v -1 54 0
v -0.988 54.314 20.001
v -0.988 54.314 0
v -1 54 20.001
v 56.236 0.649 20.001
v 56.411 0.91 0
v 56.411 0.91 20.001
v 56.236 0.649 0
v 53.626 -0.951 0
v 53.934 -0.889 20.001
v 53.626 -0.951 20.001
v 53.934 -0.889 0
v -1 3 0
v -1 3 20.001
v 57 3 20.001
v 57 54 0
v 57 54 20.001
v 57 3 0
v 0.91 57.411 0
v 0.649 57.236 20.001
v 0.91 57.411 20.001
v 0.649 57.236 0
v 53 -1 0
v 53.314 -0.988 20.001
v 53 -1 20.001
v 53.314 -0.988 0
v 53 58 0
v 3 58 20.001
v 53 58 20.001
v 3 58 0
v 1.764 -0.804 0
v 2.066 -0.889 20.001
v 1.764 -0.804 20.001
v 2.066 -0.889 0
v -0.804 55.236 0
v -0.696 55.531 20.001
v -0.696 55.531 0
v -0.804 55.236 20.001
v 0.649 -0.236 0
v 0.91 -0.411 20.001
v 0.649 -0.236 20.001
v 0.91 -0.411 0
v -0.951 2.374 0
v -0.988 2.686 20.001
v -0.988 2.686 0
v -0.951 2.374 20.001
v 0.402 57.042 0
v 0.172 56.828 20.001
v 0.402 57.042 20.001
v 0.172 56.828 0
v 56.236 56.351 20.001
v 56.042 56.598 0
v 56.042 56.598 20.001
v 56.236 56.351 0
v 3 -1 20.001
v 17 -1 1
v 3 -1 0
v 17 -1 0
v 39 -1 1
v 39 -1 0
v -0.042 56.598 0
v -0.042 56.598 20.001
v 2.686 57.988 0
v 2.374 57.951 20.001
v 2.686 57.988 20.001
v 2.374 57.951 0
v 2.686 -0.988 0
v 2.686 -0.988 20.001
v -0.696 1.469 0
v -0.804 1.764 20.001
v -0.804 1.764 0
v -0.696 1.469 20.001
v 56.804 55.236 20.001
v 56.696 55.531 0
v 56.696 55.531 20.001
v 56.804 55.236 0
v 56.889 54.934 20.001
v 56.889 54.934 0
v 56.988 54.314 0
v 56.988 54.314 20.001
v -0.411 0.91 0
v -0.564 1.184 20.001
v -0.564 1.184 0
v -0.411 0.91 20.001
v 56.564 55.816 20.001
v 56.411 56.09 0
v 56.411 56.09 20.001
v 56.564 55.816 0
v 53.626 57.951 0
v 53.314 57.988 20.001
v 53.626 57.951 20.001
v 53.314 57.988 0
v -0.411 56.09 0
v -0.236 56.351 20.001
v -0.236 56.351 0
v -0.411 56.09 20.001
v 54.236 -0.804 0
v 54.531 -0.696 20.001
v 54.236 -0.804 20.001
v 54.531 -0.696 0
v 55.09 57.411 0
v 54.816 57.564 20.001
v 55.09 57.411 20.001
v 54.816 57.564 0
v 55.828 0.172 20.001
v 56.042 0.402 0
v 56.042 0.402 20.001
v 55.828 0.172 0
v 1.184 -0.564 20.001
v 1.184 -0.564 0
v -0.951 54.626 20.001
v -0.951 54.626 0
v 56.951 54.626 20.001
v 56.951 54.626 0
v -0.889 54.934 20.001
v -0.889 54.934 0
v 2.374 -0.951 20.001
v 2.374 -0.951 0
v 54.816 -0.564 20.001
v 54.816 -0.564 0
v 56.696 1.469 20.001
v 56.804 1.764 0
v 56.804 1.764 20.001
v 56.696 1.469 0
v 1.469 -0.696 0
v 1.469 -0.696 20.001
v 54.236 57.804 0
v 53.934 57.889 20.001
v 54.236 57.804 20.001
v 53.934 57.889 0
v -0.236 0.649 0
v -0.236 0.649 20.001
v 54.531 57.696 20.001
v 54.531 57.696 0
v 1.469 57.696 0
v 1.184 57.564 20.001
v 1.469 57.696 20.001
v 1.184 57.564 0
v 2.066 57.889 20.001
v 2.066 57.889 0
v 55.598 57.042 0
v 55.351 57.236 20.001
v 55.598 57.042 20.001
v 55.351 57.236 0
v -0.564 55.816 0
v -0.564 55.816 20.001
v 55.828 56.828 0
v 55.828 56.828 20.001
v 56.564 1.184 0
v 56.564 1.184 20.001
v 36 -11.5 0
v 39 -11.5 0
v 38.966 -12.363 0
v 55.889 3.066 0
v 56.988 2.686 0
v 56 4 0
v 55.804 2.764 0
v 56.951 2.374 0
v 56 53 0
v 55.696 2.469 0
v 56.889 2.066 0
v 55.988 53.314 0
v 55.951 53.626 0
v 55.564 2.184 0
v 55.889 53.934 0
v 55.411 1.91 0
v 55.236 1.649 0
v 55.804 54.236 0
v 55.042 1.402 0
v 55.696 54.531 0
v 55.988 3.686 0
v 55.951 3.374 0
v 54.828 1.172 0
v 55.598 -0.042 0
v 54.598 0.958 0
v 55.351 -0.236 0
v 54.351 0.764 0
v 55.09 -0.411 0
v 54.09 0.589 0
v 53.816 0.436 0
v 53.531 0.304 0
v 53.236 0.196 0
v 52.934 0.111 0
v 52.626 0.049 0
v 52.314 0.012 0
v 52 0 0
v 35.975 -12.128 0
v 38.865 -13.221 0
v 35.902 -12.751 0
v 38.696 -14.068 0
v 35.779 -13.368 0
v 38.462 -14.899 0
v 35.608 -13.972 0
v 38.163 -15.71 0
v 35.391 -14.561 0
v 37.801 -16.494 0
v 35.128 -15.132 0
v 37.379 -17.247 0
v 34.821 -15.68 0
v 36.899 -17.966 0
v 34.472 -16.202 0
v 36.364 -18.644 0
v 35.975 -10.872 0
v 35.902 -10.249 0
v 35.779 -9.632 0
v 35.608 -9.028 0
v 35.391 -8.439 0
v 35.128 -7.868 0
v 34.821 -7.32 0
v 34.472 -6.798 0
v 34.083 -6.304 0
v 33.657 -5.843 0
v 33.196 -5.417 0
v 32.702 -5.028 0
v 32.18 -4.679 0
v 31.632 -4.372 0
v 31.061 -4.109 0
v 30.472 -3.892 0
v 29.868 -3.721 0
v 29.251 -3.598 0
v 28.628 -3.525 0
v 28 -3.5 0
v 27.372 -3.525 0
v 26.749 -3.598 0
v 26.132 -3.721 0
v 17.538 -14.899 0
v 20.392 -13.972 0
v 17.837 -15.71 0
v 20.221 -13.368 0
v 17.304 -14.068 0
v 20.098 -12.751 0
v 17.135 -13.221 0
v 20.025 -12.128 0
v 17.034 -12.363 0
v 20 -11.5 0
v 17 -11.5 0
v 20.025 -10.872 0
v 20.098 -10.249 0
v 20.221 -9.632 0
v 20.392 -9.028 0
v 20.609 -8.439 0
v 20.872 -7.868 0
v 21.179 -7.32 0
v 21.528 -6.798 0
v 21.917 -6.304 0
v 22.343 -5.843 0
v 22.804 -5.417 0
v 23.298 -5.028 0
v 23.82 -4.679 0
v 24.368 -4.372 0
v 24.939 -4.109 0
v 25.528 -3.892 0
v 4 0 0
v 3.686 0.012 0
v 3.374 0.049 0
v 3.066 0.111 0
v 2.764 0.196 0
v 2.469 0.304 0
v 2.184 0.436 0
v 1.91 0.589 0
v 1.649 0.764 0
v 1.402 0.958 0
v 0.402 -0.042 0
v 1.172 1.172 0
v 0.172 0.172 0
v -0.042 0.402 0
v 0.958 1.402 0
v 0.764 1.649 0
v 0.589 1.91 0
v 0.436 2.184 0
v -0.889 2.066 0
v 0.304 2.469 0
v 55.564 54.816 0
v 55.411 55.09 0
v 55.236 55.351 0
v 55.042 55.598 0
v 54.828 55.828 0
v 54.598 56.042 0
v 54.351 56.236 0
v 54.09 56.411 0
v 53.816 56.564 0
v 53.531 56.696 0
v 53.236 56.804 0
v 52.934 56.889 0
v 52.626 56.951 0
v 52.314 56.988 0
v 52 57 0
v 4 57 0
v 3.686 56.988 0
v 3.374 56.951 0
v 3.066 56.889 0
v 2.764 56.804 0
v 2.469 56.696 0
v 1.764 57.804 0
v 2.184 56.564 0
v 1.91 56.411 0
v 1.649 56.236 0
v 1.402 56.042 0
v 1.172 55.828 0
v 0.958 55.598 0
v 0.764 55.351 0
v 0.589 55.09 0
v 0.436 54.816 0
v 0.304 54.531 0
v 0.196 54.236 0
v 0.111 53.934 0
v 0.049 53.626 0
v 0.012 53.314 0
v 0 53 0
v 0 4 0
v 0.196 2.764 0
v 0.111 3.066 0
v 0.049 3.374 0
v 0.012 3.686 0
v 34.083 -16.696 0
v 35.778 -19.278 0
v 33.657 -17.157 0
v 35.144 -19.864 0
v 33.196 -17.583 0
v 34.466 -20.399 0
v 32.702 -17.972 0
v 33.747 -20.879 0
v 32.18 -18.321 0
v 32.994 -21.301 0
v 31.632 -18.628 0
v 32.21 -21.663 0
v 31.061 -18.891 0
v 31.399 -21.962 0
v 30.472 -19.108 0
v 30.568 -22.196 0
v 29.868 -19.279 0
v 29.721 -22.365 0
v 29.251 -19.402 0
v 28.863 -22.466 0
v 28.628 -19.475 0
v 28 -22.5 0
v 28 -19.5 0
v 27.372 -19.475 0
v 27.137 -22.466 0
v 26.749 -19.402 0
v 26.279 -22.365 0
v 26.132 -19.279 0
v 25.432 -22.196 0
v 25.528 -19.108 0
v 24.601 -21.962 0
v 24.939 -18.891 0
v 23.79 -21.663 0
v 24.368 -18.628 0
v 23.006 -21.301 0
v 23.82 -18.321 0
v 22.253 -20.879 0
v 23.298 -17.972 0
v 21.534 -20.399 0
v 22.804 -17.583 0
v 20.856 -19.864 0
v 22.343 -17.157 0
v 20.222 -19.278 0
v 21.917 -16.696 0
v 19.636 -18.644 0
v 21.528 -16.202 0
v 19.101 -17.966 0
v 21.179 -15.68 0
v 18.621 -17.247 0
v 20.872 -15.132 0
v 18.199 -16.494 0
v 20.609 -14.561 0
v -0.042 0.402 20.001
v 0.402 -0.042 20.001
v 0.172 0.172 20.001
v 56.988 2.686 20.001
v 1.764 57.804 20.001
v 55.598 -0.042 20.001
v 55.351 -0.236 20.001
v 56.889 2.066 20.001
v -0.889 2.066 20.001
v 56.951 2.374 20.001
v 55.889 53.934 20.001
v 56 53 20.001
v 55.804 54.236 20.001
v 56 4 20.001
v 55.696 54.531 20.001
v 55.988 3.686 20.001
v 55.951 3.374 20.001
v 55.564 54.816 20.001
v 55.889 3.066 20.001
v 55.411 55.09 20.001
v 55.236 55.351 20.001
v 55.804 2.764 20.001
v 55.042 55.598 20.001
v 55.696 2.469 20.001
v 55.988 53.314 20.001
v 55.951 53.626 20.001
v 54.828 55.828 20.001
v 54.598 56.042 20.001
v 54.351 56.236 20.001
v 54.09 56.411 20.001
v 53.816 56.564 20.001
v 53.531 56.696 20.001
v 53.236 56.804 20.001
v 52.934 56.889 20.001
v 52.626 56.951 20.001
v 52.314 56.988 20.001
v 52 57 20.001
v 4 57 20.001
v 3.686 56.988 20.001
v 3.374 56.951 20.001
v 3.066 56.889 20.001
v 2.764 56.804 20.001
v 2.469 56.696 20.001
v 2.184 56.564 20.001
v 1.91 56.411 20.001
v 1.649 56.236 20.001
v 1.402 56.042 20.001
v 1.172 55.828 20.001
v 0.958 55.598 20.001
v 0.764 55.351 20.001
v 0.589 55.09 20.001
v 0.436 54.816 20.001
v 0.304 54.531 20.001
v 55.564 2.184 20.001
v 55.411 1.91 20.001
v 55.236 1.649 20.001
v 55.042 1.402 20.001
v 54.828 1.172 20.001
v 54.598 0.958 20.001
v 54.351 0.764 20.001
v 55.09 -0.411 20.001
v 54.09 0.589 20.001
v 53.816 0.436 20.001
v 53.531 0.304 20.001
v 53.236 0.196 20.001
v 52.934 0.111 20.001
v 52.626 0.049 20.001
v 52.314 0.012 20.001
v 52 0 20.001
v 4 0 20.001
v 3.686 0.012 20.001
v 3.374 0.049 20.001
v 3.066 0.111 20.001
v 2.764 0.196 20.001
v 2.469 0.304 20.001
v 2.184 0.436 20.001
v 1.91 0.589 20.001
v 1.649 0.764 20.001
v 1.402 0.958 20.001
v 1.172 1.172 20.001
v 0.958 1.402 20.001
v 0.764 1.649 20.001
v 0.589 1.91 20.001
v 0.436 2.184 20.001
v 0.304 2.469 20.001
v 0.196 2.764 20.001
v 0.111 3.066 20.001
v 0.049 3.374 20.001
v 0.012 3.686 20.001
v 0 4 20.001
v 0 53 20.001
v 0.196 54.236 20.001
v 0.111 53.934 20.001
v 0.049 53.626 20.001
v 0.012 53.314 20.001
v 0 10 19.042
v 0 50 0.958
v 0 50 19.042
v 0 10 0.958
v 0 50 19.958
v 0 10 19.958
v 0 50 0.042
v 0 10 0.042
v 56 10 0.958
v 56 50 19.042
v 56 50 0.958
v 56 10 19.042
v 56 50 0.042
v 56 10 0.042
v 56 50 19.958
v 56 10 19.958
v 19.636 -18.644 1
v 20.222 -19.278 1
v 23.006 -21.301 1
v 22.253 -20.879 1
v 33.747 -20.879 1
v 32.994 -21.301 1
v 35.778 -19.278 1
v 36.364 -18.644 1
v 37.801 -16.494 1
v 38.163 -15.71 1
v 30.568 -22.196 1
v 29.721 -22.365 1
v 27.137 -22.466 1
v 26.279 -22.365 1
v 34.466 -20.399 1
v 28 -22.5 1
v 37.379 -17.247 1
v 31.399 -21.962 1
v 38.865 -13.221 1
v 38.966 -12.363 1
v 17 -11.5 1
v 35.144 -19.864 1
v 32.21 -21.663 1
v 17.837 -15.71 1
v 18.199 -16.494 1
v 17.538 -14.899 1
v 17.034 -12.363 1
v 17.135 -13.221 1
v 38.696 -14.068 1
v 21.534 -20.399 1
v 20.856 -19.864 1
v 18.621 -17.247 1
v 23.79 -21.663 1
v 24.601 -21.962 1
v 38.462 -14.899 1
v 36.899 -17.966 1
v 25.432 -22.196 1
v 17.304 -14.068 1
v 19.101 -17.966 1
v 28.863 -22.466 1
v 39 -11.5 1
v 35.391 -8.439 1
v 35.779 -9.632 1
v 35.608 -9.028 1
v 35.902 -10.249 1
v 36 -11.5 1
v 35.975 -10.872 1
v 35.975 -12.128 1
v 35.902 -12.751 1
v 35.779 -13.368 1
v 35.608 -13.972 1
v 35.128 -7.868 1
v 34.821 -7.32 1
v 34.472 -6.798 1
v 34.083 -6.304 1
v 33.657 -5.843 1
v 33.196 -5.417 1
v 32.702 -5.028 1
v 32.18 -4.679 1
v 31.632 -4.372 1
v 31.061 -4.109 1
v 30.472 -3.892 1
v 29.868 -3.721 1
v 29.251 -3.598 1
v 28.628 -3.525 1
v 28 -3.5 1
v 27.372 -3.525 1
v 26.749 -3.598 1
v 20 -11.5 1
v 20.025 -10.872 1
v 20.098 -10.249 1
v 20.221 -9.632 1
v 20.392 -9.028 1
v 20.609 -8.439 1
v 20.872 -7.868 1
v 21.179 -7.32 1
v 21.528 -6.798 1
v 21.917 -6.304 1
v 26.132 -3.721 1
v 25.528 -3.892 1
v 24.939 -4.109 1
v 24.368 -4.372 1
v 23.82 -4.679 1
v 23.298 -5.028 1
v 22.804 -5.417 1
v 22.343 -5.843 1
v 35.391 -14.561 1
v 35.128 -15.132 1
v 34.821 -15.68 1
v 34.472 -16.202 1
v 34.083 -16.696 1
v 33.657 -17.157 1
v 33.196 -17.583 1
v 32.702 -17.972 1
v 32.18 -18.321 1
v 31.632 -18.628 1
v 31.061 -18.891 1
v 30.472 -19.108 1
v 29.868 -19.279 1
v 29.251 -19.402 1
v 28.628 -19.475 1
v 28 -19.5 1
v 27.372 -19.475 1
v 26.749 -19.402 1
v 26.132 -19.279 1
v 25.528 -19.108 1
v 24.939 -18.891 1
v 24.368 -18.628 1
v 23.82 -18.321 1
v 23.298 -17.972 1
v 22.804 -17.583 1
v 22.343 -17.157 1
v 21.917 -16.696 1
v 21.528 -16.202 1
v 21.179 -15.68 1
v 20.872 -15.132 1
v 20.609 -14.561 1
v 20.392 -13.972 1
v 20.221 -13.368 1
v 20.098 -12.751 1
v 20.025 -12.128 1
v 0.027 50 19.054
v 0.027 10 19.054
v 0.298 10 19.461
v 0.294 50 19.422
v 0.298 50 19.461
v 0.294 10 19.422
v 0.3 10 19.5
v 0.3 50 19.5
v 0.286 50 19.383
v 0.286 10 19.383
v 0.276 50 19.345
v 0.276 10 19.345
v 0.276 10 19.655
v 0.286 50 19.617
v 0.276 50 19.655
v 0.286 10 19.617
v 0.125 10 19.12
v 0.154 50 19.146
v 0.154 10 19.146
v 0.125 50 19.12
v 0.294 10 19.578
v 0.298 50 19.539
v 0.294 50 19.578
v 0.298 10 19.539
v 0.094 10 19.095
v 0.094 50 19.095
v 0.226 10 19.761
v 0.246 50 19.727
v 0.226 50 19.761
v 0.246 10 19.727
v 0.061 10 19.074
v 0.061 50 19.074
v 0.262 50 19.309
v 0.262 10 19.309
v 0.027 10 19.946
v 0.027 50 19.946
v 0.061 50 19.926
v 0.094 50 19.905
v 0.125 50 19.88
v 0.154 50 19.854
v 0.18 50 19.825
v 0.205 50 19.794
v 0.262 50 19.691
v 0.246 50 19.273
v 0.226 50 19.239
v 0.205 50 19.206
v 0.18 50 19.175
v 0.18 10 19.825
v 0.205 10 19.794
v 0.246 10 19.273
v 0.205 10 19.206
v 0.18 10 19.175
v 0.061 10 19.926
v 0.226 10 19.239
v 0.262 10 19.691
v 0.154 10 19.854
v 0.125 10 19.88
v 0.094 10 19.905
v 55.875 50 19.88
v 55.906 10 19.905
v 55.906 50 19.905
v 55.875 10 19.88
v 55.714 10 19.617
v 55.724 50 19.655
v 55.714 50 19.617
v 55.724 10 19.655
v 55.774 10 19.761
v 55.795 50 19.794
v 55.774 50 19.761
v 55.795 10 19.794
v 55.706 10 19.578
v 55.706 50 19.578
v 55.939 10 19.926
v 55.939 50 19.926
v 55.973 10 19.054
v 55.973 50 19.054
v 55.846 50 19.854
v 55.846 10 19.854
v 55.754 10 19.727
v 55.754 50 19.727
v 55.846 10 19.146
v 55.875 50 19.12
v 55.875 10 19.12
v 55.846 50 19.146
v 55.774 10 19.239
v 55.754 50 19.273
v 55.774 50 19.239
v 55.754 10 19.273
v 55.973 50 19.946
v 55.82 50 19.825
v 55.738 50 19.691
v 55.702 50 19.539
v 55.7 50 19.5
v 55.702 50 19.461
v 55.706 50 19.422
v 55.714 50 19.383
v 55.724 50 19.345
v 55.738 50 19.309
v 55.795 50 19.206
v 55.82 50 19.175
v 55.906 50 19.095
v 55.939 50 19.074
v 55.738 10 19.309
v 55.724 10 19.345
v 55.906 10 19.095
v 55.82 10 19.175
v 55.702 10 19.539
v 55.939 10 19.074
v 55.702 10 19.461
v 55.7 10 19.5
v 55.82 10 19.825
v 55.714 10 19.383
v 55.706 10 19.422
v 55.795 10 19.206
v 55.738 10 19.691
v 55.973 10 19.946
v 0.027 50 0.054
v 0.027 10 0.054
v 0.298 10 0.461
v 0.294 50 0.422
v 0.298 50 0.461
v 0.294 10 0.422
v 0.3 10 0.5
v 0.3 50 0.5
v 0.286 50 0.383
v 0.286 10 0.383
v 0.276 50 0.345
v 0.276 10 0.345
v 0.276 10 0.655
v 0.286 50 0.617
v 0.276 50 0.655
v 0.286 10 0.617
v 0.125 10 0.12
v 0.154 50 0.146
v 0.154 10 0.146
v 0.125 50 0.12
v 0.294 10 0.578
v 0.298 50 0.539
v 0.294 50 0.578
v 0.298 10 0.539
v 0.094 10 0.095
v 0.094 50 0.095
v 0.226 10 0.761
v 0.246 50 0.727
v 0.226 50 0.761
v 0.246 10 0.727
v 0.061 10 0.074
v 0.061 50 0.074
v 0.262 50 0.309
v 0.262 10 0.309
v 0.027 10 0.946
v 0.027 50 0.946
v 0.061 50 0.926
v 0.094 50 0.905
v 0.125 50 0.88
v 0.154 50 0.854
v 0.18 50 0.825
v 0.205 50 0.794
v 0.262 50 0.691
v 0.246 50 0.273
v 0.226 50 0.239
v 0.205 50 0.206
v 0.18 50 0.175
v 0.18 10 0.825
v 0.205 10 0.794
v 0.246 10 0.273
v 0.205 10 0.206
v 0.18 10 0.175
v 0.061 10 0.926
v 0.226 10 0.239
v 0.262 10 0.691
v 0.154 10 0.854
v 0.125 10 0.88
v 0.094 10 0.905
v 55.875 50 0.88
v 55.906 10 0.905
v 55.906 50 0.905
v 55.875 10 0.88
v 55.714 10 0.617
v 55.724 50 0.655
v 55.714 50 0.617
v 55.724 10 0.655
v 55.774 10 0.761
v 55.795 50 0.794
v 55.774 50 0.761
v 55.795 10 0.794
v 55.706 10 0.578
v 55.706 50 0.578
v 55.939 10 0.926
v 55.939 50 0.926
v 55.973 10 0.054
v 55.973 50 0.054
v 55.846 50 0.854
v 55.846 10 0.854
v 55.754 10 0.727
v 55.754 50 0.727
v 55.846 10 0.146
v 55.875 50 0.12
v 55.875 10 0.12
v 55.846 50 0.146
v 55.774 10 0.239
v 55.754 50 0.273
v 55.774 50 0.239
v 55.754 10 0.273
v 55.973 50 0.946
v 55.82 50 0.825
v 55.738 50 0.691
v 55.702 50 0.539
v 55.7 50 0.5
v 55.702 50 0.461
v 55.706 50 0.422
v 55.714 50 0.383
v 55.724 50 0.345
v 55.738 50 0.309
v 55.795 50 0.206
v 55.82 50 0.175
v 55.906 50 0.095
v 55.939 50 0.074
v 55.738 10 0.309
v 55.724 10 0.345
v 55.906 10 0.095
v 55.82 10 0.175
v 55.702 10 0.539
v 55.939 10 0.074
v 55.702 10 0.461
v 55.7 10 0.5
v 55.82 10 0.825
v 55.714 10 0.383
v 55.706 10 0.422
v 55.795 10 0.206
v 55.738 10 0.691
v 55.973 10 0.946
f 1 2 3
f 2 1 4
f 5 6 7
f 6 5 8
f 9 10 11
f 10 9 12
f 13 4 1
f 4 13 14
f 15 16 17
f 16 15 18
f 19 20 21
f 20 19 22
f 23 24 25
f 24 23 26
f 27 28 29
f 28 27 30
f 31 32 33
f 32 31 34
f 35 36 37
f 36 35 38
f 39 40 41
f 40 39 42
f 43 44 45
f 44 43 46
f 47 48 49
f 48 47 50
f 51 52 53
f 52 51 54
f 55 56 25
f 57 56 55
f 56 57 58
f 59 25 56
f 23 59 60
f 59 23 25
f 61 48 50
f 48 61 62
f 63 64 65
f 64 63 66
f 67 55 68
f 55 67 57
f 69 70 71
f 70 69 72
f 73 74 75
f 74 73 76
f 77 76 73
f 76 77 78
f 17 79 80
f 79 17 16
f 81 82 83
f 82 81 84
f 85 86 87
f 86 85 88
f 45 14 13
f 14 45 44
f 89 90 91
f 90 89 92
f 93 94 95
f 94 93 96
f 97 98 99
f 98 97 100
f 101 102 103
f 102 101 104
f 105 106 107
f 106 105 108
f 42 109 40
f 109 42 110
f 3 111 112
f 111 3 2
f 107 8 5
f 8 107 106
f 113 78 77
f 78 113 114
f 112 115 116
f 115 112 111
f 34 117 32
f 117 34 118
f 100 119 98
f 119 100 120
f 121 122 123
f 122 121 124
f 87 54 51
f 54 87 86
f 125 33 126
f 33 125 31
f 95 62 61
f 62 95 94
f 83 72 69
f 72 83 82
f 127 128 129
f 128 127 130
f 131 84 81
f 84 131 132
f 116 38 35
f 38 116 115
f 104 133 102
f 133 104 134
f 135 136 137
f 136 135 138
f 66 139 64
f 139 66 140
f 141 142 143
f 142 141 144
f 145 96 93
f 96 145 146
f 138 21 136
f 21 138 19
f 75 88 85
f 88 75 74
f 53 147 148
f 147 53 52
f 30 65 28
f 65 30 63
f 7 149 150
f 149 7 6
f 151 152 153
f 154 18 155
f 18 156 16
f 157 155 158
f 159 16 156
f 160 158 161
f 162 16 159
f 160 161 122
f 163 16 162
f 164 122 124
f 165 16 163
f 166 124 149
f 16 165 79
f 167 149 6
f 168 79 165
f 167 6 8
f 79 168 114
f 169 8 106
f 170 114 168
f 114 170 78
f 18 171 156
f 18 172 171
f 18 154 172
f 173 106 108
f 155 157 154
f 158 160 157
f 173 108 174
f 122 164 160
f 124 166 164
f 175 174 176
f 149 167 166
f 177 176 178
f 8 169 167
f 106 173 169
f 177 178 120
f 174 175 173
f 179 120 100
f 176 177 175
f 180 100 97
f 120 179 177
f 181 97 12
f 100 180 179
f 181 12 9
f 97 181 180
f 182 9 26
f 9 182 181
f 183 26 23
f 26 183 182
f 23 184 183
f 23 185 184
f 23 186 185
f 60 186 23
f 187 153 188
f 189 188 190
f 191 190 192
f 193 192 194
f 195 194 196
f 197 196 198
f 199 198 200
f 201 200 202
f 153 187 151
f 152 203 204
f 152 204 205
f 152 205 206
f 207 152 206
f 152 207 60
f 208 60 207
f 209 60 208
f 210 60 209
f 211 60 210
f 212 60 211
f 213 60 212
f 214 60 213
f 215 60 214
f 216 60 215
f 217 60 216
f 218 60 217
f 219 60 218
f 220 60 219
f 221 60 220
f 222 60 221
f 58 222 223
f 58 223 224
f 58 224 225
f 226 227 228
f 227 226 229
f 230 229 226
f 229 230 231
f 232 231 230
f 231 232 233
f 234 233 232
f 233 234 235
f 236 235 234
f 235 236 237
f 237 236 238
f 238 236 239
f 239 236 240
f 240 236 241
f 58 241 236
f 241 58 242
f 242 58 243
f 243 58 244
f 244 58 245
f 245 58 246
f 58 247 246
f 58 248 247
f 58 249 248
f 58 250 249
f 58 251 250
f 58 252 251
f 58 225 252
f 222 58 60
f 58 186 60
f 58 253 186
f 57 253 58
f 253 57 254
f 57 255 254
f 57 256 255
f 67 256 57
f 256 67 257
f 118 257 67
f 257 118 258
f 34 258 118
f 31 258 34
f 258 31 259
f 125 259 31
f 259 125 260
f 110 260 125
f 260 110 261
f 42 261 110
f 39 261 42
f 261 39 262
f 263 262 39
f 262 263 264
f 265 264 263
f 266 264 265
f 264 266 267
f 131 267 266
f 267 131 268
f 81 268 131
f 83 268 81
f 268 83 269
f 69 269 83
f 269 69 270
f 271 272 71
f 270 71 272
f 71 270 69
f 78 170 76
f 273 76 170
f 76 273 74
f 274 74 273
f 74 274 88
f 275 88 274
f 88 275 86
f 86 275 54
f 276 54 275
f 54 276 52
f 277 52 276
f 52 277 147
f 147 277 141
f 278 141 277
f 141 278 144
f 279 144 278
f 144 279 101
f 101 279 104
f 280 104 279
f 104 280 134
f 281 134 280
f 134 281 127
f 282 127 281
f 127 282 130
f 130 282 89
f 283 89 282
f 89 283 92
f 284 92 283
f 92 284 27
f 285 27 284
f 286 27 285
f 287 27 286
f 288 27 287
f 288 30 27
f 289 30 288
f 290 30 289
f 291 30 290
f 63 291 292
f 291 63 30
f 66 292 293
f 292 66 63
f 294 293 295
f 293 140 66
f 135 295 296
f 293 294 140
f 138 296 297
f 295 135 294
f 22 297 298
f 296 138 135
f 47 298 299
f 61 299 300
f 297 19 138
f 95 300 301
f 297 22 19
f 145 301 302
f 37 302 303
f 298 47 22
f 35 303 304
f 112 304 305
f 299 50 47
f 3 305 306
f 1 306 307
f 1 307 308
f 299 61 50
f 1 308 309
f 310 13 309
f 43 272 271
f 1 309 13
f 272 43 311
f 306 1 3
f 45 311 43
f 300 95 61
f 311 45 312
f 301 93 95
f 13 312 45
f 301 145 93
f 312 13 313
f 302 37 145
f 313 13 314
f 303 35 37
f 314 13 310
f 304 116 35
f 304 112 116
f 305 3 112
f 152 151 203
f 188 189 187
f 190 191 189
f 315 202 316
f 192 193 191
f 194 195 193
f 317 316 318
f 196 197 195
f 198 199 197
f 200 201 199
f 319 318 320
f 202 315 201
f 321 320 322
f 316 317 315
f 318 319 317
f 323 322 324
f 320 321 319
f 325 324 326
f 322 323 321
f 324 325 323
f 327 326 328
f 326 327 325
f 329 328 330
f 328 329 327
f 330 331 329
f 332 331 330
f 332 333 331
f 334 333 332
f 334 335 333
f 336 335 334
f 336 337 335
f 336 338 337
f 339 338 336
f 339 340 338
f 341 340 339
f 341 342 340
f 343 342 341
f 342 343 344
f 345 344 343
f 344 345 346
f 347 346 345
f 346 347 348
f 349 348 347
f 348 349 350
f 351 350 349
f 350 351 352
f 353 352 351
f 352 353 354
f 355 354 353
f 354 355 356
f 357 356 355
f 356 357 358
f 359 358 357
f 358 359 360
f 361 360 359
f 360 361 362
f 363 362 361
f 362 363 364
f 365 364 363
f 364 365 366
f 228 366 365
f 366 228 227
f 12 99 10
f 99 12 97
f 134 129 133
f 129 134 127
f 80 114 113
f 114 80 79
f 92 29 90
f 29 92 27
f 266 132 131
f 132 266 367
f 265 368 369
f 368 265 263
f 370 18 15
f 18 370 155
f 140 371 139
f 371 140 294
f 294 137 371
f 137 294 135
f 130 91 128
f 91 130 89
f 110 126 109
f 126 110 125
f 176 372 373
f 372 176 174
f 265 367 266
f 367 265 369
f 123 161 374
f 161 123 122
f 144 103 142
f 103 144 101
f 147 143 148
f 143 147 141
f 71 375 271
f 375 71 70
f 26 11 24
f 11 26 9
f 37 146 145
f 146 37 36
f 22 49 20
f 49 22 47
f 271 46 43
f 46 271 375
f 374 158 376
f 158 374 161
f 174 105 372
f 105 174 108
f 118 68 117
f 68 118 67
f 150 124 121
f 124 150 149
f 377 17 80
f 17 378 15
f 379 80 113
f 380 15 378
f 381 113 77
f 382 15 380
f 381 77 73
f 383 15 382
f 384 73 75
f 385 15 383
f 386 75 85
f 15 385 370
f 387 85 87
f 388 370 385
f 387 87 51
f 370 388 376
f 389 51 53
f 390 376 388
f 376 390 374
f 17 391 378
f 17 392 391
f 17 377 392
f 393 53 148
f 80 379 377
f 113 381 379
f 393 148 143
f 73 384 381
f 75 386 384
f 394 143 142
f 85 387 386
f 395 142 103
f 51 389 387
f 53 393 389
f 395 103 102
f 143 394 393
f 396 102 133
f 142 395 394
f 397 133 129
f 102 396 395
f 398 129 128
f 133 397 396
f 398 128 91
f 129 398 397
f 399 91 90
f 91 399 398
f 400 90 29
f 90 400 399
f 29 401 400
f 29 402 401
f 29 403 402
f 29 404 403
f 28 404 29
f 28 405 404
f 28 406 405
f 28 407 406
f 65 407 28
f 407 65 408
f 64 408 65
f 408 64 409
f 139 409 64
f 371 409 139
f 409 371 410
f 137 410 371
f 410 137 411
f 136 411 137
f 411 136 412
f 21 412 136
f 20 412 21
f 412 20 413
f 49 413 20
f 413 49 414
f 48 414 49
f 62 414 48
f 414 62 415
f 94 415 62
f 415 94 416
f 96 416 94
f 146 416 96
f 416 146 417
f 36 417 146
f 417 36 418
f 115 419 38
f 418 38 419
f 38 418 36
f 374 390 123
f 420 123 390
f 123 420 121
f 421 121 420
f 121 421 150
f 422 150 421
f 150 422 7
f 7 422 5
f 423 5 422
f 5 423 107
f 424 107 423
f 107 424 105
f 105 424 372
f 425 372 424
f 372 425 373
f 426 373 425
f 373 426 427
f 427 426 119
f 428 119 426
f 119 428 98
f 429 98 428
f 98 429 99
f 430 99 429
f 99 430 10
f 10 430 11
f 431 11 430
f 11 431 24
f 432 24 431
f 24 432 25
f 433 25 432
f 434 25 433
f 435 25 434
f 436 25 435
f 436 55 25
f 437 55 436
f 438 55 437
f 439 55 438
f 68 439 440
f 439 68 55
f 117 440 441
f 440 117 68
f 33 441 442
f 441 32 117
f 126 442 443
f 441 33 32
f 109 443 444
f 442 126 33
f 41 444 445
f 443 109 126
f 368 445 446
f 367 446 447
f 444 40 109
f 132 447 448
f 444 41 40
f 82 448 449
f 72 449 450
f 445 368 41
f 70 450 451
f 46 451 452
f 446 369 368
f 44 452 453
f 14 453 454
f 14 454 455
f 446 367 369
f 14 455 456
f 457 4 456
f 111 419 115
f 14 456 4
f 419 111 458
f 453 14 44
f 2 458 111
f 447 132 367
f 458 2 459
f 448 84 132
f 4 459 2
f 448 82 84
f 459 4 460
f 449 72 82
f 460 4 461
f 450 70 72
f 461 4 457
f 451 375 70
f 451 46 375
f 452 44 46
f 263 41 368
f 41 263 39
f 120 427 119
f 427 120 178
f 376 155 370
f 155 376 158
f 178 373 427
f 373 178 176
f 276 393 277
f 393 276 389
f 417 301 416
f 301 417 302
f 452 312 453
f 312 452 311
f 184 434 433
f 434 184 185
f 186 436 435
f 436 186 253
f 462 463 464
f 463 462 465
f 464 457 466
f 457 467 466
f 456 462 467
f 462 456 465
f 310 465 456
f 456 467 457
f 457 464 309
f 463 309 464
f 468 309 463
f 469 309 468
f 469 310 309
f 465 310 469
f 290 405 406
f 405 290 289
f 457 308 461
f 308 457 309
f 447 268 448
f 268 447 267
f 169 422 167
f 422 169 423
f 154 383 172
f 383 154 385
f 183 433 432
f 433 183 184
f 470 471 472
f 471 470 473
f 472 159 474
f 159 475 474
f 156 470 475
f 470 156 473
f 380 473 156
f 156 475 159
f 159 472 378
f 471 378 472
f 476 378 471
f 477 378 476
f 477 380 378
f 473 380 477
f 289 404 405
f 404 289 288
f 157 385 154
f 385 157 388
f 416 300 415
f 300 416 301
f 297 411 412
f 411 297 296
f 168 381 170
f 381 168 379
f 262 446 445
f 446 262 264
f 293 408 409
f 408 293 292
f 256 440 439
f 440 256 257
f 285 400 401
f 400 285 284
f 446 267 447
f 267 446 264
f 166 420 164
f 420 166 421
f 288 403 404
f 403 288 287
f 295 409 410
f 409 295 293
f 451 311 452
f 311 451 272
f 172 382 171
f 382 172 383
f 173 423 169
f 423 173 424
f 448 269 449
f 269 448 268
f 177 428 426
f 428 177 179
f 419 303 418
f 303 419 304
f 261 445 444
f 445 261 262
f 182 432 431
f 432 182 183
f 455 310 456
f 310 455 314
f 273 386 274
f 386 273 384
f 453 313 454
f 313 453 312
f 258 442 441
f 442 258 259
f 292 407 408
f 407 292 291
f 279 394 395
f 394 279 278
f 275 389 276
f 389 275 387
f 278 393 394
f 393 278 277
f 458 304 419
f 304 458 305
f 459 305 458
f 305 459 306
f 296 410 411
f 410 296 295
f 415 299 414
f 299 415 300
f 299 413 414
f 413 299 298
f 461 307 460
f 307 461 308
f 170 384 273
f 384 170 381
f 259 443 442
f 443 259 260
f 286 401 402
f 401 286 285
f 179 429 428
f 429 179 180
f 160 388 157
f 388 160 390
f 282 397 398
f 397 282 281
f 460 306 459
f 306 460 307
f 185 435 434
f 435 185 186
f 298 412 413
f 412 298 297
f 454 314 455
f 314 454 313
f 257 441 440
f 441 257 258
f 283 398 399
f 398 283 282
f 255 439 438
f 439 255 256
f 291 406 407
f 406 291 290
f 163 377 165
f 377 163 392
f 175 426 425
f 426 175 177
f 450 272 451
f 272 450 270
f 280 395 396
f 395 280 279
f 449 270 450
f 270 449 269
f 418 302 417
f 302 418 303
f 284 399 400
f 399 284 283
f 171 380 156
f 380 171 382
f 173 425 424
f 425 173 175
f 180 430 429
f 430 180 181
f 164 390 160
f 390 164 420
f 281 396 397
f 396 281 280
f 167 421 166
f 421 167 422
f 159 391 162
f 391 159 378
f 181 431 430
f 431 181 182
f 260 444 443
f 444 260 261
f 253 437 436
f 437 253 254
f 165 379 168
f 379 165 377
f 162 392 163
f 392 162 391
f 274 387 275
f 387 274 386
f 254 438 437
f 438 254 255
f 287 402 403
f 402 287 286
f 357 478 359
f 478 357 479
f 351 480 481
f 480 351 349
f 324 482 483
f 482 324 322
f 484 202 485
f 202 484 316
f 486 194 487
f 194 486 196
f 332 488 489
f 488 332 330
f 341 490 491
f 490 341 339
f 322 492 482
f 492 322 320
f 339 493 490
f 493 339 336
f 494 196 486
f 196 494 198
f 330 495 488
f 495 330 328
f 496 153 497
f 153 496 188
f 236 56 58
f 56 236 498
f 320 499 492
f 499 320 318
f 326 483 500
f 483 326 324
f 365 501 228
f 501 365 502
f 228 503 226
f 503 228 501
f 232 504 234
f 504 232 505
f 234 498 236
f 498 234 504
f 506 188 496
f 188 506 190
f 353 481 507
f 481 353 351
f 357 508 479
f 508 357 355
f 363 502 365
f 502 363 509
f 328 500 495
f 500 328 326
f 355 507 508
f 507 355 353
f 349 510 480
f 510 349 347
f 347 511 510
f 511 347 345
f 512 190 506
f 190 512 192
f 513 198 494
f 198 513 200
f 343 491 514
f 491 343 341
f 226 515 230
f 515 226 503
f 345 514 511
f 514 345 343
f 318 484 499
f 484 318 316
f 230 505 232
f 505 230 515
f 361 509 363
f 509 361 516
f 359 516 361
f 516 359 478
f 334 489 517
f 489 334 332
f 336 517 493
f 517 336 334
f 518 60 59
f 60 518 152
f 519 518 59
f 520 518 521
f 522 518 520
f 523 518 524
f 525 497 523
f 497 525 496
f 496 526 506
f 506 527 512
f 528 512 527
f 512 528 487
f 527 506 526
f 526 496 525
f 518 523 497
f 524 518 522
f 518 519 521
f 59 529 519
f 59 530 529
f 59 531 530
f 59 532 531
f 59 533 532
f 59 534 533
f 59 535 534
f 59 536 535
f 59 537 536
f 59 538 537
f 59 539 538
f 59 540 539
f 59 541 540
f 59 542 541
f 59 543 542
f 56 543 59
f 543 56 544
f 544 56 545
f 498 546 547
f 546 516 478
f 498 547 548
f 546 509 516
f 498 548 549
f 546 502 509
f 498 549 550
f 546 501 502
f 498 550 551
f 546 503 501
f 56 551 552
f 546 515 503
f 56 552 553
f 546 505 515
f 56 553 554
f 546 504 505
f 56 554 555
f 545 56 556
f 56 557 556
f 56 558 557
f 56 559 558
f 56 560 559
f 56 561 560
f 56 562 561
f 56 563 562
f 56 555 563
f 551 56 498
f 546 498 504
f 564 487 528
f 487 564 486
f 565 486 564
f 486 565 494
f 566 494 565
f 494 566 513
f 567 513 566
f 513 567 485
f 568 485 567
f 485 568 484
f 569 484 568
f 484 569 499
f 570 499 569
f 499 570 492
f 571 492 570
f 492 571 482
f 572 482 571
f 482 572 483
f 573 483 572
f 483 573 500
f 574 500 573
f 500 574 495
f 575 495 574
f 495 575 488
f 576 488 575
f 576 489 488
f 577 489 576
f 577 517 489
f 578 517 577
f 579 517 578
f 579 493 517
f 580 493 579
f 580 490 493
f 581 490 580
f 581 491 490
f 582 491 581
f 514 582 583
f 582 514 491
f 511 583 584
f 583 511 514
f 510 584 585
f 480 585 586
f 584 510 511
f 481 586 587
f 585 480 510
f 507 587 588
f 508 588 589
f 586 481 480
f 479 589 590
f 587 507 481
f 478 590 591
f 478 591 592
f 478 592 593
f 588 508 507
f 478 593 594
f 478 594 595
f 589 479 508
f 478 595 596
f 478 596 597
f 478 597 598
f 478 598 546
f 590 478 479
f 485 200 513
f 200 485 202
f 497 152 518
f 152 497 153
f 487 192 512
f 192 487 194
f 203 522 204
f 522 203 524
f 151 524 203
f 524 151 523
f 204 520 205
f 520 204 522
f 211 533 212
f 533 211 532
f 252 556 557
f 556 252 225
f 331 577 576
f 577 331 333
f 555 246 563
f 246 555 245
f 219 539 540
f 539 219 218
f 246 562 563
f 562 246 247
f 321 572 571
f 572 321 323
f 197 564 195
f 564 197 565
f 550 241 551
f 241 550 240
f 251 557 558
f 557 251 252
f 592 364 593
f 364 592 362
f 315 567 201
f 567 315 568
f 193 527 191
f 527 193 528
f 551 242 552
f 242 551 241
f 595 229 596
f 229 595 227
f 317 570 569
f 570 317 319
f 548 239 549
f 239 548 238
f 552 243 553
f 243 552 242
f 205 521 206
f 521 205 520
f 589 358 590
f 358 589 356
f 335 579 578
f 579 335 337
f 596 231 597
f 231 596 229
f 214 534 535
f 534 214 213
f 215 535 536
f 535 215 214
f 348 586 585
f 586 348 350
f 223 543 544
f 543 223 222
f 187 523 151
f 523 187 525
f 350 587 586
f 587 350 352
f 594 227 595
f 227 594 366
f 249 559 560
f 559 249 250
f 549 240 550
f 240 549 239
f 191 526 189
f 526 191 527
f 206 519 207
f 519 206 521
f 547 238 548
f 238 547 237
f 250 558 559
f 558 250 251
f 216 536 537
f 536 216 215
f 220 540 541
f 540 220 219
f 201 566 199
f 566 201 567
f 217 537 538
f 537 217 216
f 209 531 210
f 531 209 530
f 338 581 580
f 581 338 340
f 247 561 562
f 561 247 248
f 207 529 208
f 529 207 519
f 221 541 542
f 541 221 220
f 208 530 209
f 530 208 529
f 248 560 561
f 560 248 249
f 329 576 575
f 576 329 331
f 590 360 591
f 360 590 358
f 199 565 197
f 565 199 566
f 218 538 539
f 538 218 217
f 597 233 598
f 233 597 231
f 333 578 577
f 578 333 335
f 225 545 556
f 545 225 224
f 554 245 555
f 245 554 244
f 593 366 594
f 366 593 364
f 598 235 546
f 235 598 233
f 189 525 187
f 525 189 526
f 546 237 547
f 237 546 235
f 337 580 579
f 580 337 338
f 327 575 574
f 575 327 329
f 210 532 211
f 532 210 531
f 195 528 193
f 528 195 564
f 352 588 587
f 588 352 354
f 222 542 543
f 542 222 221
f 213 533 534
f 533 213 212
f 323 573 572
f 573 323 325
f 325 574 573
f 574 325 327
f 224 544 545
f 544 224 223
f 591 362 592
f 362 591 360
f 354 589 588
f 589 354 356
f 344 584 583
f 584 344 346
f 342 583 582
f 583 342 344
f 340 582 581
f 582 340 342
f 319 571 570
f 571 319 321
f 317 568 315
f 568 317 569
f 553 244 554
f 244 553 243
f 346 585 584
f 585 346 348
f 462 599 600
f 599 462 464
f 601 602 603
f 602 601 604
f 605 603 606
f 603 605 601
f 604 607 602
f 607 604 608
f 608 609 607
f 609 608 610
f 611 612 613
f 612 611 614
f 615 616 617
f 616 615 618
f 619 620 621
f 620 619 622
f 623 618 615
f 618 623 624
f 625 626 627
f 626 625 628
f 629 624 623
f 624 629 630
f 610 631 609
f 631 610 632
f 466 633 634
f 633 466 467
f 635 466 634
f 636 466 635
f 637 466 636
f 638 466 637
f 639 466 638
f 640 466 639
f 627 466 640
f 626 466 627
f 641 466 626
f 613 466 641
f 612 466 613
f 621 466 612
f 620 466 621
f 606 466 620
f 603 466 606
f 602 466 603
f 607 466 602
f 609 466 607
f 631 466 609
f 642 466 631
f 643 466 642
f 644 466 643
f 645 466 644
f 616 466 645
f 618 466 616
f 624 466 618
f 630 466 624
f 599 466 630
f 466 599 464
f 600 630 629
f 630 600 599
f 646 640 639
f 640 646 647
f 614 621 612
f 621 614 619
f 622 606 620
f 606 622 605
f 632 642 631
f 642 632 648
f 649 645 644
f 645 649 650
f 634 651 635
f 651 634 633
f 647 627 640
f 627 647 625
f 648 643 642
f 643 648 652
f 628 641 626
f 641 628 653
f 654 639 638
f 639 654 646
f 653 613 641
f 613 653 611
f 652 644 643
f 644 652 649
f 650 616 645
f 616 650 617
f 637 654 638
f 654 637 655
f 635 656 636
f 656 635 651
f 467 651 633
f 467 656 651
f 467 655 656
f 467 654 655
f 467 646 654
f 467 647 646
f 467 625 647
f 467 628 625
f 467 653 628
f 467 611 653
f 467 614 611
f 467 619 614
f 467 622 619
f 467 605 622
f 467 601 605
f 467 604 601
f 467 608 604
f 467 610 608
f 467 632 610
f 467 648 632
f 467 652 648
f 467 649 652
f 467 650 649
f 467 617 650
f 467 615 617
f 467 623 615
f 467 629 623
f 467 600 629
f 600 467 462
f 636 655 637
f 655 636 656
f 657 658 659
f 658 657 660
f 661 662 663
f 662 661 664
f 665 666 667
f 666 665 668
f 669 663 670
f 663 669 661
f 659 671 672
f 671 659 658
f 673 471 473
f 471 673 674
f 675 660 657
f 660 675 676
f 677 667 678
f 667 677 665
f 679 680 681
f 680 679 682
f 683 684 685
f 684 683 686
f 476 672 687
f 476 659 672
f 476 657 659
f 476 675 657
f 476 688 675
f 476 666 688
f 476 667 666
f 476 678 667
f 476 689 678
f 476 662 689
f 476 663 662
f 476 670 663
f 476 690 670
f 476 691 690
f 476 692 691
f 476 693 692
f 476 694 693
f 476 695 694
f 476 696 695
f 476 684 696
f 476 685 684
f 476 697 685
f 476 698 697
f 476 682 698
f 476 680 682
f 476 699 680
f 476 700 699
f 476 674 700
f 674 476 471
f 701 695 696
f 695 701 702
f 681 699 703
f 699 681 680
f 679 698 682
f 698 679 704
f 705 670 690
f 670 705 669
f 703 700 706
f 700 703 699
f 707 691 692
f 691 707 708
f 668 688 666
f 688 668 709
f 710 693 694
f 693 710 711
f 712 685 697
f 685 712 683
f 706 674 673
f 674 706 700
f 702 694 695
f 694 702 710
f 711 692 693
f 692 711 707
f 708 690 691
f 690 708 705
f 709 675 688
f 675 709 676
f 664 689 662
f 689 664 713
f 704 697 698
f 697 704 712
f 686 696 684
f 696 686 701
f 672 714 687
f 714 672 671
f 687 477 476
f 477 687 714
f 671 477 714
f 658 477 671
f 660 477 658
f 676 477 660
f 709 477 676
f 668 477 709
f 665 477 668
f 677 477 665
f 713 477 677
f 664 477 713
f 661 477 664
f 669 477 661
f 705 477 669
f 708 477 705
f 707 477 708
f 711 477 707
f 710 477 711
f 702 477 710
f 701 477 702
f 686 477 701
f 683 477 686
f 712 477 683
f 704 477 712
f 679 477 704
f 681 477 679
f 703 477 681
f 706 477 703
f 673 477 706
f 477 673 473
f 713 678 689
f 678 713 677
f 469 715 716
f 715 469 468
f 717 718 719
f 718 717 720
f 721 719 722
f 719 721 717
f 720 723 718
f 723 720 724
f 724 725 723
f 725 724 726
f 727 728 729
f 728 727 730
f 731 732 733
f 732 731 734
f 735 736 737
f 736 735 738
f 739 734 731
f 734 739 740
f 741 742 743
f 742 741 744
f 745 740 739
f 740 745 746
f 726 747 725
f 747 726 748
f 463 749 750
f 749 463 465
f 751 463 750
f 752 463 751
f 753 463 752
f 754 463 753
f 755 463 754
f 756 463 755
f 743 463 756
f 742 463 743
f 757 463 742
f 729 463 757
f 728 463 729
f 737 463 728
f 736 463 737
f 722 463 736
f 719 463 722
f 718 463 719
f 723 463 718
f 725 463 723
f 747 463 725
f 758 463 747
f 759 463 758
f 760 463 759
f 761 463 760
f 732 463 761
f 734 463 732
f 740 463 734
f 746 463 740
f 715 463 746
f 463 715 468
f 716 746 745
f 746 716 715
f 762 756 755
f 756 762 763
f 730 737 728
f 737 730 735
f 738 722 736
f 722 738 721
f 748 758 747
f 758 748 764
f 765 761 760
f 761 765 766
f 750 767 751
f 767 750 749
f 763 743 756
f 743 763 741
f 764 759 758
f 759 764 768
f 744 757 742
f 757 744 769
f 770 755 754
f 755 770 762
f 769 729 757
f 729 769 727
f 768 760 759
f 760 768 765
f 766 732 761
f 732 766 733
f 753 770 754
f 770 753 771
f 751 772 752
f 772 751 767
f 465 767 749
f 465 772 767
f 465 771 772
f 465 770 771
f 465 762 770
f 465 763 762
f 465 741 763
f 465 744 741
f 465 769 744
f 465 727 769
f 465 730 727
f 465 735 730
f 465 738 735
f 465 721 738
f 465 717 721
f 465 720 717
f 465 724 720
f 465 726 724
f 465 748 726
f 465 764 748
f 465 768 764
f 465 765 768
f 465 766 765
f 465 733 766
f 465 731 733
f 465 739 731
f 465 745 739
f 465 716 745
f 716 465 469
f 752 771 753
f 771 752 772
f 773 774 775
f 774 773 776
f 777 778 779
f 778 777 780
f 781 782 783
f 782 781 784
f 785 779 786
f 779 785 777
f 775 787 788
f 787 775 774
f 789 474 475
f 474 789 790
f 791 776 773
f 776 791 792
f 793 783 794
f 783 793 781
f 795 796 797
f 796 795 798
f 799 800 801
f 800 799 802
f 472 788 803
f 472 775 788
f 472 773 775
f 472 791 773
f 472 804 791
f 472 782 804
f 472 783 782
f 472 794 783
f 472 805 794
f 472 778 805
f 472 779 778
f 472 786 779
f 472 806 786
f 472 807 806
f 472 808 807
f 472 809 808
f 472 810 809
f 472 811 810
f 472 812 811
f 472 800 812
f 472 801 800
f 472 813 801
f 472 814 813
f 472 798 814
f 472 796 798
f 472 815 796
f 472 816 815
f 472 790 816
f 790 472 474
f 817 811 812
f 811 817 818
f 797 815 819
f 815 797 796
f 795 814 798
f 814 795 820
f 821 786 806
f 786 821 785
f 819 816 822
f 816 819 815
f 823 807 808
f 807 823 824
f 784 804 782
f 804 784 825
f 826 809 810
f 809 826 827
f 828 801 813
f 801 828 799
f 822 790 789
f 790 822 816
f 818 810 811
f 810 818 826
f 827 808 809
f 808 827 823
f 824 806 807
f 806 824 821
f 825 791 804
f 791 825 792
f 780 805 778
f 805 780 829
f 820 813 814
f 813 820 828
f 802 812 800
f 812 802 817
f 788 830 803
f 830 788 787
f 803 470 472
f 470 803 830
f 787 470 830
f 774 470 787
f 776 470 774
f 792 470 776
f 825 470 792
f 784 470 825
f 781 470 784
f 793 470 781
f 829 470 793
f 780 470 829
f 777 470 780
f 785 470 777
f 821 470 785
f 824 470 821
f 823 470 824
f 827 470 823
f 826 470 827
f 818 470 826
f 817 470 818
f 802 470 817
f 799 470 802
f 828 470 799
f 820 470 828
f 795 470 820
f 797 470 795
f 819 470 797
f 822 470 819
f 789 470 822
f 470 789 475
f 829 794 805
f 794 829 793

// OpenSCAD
$fn=80;
extra=0.01;

rad=4;
height=20;

wall=1;
xLen=56;
yLen=56;
yLenPlay=1;

/* FRAME */
{
  translate([rad-wall,rad-wall,0]) /* place inner dimension to root x=0 y=0 */
  difference()
  {
    minkowski()
    {
      cube([xLen+wall*2-rad*2,yLen+wall*2+yLenPlay-rad*2,height]);
      cylinder(r=rad,h=0.001);
    }
    translate([wall,wall,-extra])
    minkowski()
    {
      cube([xLen-rad*2,yLen+yLenPlay-rad*2,height+extra*2]);
      cylinder(r=rad,h=0.001);
    }
  }

  translate([-0.2,10,height-0.5])
  rotate([-90,0,0])
  cylinder(r=0.5,h=40);

  translate([xLen+0.2,10,height-0.5])
  rotate([-90,0,0])
  cylinder(r=0.5,h=40);

  translate([-0.2,10,0.5])
  rotate([-90,0,0])
  cylinder(r=0.5,h=40);

  translate([xLen+0.2,10,0.5])
  rotate([-90,0,0])
  cylinder(r=0.5,h=40);
}

/* LUG */
{
  translate([(xLen)/2,-11.5,0])
  difference() {
    hull()
    {
      cylinder(r=11,h=1);
      translate([-11,0,0])
      cube([22,11,1]);
    }
    cylinder(r=8,h=1+extra);
  }
}
